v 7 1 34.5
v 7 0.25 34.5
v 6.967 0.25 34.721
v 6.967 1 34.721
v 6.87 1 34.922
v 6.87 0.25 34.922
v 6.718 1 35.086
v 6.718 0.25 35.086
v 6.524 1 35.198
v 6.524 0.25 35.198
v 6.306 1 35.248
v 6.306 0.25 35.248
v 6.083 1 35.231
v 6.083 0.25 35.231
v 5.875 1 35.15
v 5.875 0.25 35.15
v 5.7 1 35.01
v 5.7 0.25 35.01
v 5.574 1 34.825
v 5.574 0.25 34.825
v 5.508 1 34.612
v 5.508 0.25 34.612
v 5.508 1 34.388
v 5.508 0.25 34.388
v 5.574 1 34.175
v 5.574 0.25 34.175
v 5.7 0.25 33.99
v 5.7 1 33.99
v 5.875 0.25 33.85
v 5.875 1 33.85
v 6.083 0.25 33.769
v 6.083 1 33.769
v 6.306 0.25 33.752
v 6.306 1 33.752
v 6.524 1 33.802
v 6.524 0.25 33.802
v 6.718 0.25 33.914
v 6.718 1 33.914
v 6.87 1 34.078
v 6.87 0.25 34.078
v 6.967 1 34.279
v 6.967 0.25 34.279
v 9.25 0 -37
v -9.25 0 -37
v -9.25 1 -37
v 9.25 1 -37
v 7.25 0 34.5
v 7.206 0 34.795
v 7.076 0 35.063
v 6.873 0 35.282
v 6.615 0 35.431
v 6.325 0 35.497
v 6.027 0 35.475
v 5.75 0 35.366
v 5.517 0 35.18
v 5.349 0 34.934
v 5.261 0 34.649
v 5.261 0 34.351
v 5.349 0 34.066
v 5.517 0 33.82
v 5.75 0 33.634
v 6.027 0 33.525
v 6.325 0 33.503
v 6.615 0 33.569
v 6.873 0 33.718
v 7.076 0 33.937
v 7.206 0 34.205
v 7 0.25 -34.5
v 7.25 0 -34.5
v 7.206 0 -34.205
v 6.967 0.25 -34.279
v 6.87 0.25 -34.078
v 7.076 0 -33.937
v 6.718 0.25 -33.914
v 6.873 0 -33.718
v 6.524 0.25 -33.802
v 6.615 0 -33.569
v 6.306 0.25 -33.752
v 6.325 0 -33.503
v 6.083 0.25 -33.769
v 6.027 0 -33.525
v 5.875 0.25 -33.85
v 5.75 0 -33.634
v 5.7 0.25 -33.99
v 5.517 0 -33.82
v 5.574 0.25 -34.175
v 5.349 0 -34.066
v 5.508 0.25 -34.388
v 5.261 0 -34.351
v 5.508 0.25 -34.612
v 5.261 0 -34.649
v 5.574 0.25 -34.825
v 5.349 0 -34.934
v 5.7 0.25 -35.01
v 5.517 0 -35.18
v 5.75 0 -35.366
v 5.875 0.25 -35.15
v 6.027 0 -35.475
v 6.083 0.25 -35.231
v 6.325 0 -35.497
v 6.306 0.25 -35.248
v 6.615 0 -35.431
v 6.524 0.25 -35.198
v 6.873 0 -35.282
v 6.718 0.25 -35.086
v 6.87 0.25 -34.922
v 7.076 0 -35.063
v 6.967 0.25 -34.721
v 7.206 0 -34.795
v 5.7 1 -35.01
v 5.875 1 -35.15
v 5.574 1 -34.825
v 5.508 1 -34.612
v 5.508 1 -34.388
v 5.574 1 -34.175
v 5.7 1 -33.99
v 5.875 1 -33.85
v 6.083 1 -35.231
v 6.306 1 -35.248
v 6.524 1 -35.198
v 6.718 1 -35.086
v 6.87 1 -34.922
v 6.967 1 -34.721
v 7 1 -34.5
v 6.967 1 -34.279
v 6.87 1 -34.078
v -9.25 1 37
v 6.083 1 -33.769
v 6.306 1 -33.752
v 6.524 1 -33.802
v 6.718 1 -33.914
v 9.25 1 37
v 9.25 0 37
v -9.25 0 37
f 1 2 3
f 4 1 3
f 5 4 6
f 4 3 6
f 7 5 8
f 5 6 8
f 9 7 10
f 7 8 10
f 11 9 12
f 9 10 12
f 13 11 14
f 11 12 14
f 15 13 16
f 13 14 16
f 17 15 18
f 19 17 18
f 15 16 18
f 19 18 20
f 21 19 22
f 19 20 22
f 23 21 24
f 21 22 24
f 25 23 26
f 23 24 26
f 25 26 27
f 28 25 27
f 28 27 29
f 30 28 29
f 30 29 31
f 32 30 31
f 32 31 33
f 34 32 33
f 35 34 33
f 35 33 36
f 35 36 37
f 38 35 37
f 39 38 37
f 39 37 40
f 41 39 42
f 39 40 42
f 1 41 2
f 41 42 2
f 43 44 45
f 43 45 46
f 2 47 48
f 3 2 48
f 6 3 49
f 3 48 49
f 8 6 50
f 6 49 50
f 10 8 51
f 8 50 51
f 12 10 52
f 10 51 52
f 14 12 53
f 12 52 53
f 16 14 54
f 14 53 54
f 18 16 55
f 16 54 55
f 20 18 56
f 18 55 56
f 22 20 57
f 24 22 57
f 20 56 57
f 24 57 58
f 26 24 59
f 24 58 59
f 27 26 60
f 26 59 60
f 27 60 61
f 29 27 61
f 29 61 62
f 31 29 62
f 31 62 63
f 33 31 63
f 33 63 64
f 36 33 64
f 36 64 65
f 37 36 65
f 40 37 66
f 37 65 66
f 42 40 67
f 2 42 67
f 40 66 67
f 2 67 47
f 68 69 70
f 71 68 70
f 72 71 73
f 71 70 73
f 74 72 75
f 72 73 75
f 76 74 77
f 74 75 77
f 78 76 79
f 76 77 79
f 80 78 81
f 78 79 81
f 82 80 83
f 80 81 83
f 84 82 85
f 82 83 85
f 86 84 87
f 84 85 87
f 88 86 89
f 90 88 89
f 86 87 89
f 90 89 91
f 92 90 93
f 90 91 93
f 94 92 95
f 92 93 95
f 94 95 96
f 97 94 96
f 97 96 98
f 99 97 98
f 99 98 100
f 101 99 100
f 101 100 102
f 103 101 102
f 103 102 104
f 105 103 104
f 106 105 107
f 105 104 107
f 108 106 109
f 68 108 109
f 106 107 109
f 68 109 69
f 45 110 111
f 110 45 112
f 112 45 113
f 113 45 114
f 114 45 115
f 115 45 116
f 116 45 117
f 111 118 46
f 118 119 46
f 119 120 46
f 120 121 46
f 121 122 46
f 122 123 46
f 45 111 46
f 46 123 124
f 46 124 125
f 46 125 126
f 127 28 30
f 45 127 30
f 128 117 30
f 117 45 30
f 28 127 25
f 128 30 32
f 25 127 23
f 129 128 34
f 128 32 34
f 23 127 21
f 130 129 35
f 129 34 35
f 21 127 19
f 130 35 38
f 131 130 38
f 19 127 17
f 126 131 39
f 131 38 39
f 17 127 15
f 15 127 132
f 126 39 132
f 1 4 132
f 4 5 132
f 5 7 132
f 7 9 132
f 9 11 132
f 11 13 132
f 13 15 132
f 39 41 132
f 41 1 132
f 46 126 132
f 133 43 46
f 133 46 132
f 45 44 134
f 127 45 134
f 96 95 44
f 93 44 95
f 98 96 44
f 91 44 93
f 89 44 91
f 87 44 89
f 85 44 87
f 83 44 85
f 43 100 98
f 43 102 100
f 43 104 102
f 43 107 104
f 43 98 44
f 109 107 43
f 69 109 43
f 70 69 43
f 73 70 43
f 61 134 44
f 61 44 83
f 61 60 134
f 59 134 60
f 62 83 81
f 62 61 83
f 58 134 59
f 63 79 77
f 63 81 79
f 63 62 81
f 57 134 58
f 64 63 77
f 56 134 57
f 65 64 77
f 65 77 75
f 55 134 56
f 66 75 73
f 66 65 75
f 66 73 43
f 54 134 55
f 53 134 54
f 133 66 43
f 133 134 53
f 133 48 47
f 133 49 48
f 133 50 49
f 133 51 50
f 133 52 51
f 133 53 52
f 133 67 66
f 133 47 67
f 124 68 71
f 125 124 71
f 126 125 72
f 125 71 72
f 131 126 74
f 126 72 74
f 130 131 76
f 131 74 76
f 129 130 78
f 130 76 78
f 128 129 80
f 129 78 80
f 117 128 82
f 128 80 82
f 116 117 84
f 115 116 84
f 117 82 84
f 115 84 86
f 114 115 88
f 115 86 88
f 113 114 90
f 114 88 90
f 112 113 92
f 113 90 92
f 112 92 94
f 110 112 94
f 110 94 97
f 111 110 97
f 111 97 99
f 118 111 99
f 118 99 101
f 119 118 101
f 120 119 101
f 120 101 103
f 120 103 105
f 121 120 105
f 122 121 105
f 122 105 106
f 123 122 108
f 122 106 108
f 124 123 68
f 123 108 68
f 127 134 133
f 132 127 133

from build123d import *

# Parameters (mm, degrees)
F0_W     = 18.5
F0_H     = 74
F0_R     = 1
F0_R_2   = 0.75
F1_DEPTH = 1
F2_SIZE  = 0.25


with BuildPart() as f1:
    # F0 (on Front) → F1 (new body)
    with BuildSketch(Plane.XZ):
        Rectangle(F0_W, F0_H)
        with Locations((6.25, -34.5)):
            Circle(F0_R, mode=Mode.SUBTRACT)
        with Locations((6.25, 34.5)):
            Circle(F0_R, mode=Mode.SUBTRACT)
        with Locations((6.25, -34.5)):
            Circle(F0_R)
        with Locations((6.25, -34.5)):
            Circle(F0_R_2, mode=Mode.SUBTRACT)
        with Locations((6.25, 34.5)):
            Circle(F0_R)
        with Locations((6.25, 34.5)):
            Circle(F0_R_2, mode=Mode.SUBTRACT)
    extrude(amount=-F1_DEPTH)

    # F2
    f2_edges = [f1.edges().sort_by_distance(p)[0] for p in [
        (5.5, 0, -34.5),
        (5.5, 0, 34.5),
    ]]
    chamfer(f2_edges, length=F2_SIZE)


solid = f1.part
